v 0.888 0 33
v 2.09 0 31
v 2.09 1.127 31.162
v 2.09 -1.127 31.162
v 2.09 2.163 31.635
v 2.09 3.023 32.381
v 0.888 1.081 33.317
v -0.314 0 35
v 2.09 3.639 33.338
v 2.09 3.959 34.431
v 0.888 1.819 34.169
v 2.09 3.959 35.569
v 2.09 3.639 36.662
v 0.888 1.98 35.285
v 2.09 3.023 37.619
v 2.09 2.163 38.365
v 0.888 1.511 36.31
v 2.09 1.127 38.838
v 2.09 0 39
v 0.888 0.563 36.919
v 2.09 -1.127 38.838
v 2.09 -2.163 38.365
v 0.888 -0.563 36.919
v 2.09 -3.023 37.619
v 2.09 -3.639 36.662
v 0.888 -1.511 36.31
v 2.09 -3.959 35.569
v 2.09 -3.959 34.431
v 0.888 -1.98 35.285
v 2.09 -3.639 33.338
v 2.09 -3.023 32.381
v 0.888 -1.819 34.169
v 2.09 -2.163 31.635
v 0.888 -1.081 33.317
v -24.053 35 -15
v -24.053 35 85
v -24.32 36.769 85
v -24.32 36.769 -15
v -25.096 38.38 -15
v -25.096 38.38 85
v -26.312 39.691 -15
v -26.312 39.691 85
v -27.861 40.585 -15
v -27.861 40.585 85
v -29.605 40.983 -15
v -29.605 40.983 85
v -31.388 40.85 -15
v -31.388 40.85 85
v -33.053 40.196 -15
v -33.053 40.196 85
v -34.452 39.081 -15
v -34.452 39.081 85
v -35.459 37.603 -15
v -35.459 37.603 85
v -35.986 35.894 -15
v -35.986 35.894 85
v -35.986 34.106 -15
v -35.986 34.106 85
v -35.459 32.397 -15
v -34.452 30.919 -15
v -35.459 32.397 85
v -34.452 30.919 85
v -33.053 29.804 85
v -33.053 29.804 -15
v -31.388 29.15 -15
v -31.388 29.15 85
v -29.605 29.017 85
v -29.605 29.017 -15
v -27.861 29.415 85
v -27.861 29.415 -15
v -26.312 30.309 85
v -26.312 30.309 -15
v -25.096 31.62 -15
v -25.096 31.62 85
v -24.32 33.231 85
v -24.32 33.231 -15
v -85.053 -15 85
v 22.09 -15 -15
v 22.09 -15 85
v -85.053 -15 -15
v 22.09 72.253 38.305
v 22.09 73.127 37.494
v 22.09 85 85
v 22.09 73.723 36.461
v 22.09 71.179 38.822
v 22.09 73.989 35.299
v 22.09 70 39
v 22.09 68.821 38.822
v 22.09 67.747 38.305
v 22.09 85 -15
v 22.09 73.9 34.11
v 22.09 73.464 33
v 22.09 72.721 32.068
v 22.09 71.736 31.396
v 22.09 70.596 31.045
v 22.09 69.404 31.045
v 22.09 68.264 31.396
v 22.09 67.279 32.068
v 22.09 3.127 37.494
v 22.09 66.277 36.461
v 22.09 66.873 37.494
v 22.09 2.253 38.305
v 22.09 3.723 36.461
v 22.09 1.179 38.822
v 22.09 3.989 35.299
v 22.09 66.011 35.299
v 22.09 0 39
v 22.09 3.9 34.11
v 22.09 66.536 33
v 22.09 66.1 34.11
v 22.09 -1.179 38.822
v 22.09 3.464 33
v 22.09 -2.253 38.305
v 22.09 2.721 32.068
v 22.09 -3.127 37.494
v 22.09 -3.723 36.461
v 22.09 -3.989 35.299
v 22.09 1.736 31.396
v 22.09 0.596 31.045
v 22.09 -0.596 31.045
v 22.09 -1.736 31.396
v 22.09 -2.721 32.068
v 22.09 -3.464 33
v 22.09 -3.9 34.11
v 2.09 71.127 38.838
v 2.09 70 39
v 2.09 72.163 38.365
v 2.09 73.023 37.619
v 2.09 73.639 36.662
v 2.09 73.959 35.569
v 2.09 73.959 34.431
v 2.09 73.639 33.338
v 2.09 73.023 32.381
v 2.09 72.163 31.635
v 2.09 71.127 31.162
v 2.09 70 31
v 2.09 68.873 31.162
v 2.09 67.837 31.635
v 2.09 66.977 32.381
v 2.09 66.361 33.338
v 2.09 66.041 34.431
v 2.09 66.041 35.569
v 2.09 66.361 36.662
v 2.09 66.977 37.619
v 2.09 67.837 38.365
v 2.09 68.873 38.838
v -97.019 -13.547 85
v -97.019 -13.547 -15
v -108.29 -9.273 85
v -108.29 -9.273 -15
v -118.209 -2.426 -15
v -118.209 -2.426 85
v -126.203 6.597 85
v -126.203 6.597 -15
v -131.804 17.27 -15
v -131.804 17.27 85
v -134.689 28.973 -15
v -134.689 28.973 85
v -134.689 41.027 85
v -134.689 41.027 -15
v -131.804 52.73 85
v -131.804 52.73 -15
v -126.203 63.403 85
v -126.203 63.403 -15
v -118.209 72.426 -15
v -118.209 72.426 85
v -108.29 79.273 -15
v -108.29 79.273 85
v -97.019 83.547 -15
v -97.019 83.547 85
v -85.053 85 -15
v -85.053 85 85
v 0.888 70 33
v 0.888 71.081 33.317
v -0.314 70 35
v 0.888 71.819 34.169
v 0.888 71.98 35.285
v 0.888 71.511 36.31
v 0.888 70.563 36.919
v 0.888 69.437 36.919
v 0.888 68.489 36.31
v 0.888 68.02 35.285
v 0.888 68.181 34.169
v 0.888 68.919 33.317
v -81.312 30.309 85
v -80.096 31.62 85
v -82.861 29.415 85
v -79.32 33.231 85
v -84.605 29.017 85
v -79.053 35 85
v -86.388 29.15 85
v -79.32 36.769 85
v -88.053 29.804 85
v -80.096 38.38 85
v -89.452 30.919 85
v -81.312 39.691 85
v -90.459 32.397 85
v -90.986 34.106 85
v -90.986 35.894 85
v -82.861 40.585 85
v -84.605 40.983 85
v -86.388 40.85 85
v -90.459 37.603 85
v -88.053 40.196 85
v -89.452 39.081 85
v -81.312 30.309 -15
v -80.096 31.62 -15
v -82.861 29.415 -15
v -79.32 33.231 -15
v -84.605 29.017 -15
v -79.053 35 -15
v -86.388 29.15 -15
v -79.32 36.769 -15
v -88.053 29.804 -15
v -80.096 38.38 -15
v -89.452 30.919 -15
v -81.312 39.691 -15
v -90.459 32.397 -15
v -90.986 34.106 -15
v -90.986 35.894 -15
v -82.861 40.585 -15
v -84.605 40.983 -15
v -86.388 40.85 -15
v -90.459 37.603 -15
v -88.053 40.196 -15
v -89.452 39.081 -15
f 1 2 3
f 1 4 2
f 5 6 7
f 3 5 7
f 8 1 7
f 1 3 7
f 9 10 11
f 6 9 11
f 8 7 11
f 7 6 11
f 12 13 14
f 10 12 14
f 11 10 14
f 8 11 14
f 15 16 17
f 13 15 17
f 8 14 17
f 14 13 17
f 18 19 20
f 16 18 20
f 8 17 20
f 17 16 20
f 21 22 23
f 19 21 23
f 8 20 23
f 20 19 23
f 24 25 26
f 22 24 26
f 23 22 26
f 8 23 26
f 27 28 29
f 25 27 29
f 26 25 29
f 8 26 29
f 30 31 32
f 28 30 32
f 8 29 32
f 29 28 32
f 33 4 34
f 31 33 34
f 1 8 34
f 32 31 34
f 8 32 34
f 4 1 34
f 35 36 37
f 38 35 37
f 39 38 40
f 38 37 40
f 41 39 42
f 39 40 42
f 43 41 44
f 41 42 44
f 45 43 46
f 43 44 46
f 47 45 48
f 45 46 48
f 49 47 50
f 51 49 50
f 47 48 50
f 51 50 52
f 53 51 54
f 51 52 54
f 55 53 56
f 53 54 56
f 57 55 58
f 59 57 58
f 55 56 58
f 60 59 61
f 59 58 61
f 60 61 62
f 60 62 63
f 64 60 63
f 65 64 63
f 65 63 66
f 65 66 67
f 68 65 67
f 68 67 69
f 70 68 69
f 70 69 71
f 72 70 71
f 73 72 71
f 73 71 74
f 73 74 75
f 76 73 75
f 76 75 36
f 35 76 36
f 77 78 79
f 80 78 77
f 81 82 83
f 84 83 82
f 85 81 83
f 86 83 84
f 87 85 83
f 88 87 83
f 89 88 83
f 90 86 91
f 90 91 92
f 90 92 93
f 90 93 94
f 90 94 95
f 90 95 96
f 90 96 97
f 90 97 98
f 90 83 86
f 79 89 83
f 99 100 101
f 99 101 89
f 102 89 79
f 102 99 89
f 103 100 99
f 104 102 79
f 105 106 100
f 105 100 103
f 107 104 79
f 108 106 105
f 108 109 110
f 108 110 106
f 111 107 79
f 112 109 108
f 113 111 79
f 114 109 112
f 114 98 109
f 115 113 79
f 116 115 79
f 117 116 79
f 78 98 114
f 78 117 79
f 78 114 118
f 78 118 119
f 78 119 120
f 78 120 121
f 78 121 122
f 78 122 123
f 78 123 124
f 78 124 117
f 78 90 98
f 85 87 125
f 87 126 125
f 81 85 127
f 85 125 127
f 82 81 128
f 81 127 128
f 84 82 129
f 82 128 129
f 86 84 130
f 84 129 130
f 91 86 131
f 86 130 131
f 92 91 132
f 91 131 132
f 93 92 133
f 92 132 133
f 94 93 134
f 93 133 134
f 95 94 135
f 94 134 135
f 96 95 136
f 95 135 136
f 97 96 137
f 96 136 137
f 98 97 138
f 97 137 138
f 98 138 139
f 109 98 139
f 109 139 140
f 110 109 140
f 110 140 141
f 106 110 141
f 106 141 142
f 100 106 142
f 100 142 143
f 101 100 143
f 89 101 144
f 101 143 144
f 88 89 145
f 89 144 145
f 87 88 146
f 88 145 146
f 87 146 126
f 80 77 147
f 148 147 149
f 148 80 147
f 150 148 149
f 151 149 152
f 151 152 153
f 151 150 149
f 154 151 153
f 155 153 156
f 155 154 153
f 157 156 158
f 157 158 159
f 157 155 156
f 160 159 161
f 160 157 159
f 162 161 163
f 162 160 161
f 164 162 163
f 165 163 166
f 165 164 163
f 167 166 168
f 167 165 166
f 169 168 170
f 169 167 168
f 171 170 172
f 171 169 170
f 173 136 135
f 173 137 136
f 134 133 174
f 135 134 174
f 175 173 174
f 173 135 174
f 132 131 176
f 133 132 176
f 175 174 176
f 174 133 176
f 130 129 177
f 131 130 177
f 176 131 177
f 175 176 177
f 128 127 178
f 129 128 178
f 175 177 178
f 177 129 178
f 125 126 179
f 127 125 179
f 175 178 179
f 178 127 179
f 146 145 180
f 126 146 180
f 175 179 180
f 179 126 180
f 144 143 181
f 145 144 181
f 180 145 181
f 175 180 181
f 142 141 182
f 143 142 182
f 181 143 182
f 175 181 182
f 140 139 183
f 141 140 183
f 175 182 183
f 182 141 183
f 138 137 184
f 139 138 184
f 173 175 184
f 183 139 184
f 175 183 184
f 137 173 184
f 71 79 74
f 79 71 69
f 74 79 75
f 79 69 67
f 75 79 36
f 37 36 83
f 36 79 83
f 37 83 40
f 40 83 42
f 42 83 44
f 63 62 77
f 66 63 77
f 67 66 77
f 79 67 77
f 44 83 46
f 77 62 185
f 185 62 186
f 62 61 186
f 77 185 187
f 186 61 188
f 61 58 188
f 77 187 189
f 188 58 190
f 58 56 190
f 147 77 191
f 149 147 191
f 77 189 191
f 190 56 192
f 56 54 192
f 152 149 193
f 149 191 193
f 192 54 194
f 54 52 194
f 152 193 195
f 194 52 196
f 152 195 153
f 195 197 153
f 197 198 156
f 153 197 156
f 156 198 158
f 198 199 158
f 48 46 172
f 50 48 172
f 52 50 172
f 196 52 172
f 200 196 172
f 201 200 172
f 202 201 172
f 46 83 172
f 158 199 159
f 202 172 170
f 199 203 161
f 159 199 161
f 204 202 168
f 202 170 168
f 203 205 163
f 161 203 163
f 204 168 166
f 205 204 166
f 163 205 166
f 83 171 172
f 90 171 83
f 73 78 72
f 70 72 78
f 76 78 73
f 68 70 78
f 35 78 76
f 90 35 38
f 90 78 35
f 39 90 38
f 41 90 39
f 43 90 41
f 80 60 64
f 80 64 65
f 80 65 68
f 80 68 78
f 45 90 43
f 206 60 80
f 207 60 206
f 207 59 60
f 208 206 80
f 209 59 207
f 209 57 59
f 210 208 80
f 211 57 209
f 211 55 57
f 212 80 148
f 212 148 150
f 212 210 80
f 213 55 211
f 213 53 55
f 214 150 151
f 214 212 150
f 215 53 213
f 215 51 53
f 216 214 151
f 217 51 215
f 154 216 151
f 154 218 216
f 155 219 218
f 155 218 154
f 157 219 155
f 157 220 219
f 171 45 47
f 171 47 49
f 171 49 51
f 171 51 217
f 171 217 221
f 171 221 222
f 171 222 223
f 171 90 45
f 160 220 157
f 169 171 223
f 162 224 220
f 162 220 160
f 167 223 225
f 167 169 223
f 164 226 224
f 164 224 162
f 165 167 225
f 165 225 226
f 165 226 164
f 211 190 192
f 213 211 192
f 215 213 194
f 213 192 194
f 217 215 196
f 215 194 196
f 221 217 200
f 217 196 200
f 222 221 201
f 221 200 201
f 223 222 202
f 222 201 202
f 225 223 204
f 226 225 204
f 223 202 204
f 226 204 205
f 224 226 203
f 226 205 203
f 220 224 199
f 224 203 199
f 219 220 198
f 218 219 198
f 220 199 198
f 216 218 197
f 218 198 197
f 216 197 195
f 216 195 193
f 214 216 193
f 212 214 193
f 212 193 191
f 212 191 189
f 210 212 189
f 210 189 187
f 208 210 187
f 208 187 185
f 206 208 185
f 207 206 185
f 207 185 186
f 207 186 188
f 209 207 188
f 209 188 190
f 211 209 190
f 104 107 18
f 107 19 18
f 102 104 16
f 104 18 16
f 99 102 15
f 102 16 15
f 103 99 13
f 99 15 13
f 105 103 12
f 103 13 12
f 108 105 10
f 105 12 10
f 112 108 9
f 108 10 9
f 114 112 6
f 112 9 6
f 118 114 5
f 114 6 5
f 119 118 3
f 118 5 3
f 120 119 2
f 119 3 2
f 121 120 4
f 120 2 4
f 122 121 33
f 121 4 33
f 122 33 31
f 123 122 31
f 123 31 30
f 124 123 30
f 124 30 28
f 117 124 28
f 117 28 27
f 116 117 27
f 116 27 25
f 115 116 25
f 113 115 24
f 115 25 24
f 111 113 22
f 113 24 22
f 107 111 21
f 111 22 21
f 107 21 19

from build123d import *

# Parameters (mm, degrees)
BOSS_EXTRUDE1_DEPTH       = 70
SCALE1_SCALE              = 1.428571429
F_12_0MM_DOWEL_HOLE1_D    = 12
F_8_0MM_DOWEL_HOLE3_D     = 8
F_8_0MM_DOWEL_HOLE3_DEPTH = 20
F_8_0MM_DOWEL_HOLE3_TIP   = 2.403442476


with BuildPart() as part:
    # Sketch1 → Boss-Extrude1 (new body)
    with BuildSketch(Plane.XY):
        with BuildLine():
            Line((0, 0), (-75, 0))
            ThreePointArc((-75, 0), (-110, 35), (-75, 70))
            Line((-75, 70), (0, 70))
            Line((0, 70), (0, 0))
        make_face()
    extrude(amount=BOSS_EXTRUDE1_DEPTH)


with BuildPart() as part_1:
    # Scale1: scaled about (-51.542183312, 35, 35)
    add(part.part.scale(SCALE1_SCALE).moved(Location((22.089507134, -15, -15))))

    # Ø12.0mm Dowel Hole1 (through all)
    with Locations(Plane(origin=(-30.053350009, 35, -15), x_dir=(-1, 0, 0), z_dir=(0, 0, -1))):
        with Locations((0, 0), (55, 0)):
            Hole(F_12_0MM_DOWEL_HOLE1_D / 2)

    # Ø8.0mm Dowel Hole3
    with Locations(Plane(origin=(22.089507134, 0, 0), x_dir=(0, 0, -1), z_dir=(1, 0, 0))):
        with Locations((-35, 70), (-35, 0)):
            Hole(F_8_0MM_DOWEL_HOLE3_D / 2, depth=F_8_0MM_DOWEL_HOLE3_DEPTH)
            with Locations((0, 0, -(F_8_0MM_DOWEL_HOLE3_DEPTH + F_8_0MM_DOWEL_HOLE3_TIP / 2))):  # 118° drill point
                Cone(0, F_8_0MM_DOWEL_HOLE3_D / 2, F_8_0MM_DOWEL_HOLE3_TIP, mode=Mode.SUBTRACT)


solid = part_1.part
